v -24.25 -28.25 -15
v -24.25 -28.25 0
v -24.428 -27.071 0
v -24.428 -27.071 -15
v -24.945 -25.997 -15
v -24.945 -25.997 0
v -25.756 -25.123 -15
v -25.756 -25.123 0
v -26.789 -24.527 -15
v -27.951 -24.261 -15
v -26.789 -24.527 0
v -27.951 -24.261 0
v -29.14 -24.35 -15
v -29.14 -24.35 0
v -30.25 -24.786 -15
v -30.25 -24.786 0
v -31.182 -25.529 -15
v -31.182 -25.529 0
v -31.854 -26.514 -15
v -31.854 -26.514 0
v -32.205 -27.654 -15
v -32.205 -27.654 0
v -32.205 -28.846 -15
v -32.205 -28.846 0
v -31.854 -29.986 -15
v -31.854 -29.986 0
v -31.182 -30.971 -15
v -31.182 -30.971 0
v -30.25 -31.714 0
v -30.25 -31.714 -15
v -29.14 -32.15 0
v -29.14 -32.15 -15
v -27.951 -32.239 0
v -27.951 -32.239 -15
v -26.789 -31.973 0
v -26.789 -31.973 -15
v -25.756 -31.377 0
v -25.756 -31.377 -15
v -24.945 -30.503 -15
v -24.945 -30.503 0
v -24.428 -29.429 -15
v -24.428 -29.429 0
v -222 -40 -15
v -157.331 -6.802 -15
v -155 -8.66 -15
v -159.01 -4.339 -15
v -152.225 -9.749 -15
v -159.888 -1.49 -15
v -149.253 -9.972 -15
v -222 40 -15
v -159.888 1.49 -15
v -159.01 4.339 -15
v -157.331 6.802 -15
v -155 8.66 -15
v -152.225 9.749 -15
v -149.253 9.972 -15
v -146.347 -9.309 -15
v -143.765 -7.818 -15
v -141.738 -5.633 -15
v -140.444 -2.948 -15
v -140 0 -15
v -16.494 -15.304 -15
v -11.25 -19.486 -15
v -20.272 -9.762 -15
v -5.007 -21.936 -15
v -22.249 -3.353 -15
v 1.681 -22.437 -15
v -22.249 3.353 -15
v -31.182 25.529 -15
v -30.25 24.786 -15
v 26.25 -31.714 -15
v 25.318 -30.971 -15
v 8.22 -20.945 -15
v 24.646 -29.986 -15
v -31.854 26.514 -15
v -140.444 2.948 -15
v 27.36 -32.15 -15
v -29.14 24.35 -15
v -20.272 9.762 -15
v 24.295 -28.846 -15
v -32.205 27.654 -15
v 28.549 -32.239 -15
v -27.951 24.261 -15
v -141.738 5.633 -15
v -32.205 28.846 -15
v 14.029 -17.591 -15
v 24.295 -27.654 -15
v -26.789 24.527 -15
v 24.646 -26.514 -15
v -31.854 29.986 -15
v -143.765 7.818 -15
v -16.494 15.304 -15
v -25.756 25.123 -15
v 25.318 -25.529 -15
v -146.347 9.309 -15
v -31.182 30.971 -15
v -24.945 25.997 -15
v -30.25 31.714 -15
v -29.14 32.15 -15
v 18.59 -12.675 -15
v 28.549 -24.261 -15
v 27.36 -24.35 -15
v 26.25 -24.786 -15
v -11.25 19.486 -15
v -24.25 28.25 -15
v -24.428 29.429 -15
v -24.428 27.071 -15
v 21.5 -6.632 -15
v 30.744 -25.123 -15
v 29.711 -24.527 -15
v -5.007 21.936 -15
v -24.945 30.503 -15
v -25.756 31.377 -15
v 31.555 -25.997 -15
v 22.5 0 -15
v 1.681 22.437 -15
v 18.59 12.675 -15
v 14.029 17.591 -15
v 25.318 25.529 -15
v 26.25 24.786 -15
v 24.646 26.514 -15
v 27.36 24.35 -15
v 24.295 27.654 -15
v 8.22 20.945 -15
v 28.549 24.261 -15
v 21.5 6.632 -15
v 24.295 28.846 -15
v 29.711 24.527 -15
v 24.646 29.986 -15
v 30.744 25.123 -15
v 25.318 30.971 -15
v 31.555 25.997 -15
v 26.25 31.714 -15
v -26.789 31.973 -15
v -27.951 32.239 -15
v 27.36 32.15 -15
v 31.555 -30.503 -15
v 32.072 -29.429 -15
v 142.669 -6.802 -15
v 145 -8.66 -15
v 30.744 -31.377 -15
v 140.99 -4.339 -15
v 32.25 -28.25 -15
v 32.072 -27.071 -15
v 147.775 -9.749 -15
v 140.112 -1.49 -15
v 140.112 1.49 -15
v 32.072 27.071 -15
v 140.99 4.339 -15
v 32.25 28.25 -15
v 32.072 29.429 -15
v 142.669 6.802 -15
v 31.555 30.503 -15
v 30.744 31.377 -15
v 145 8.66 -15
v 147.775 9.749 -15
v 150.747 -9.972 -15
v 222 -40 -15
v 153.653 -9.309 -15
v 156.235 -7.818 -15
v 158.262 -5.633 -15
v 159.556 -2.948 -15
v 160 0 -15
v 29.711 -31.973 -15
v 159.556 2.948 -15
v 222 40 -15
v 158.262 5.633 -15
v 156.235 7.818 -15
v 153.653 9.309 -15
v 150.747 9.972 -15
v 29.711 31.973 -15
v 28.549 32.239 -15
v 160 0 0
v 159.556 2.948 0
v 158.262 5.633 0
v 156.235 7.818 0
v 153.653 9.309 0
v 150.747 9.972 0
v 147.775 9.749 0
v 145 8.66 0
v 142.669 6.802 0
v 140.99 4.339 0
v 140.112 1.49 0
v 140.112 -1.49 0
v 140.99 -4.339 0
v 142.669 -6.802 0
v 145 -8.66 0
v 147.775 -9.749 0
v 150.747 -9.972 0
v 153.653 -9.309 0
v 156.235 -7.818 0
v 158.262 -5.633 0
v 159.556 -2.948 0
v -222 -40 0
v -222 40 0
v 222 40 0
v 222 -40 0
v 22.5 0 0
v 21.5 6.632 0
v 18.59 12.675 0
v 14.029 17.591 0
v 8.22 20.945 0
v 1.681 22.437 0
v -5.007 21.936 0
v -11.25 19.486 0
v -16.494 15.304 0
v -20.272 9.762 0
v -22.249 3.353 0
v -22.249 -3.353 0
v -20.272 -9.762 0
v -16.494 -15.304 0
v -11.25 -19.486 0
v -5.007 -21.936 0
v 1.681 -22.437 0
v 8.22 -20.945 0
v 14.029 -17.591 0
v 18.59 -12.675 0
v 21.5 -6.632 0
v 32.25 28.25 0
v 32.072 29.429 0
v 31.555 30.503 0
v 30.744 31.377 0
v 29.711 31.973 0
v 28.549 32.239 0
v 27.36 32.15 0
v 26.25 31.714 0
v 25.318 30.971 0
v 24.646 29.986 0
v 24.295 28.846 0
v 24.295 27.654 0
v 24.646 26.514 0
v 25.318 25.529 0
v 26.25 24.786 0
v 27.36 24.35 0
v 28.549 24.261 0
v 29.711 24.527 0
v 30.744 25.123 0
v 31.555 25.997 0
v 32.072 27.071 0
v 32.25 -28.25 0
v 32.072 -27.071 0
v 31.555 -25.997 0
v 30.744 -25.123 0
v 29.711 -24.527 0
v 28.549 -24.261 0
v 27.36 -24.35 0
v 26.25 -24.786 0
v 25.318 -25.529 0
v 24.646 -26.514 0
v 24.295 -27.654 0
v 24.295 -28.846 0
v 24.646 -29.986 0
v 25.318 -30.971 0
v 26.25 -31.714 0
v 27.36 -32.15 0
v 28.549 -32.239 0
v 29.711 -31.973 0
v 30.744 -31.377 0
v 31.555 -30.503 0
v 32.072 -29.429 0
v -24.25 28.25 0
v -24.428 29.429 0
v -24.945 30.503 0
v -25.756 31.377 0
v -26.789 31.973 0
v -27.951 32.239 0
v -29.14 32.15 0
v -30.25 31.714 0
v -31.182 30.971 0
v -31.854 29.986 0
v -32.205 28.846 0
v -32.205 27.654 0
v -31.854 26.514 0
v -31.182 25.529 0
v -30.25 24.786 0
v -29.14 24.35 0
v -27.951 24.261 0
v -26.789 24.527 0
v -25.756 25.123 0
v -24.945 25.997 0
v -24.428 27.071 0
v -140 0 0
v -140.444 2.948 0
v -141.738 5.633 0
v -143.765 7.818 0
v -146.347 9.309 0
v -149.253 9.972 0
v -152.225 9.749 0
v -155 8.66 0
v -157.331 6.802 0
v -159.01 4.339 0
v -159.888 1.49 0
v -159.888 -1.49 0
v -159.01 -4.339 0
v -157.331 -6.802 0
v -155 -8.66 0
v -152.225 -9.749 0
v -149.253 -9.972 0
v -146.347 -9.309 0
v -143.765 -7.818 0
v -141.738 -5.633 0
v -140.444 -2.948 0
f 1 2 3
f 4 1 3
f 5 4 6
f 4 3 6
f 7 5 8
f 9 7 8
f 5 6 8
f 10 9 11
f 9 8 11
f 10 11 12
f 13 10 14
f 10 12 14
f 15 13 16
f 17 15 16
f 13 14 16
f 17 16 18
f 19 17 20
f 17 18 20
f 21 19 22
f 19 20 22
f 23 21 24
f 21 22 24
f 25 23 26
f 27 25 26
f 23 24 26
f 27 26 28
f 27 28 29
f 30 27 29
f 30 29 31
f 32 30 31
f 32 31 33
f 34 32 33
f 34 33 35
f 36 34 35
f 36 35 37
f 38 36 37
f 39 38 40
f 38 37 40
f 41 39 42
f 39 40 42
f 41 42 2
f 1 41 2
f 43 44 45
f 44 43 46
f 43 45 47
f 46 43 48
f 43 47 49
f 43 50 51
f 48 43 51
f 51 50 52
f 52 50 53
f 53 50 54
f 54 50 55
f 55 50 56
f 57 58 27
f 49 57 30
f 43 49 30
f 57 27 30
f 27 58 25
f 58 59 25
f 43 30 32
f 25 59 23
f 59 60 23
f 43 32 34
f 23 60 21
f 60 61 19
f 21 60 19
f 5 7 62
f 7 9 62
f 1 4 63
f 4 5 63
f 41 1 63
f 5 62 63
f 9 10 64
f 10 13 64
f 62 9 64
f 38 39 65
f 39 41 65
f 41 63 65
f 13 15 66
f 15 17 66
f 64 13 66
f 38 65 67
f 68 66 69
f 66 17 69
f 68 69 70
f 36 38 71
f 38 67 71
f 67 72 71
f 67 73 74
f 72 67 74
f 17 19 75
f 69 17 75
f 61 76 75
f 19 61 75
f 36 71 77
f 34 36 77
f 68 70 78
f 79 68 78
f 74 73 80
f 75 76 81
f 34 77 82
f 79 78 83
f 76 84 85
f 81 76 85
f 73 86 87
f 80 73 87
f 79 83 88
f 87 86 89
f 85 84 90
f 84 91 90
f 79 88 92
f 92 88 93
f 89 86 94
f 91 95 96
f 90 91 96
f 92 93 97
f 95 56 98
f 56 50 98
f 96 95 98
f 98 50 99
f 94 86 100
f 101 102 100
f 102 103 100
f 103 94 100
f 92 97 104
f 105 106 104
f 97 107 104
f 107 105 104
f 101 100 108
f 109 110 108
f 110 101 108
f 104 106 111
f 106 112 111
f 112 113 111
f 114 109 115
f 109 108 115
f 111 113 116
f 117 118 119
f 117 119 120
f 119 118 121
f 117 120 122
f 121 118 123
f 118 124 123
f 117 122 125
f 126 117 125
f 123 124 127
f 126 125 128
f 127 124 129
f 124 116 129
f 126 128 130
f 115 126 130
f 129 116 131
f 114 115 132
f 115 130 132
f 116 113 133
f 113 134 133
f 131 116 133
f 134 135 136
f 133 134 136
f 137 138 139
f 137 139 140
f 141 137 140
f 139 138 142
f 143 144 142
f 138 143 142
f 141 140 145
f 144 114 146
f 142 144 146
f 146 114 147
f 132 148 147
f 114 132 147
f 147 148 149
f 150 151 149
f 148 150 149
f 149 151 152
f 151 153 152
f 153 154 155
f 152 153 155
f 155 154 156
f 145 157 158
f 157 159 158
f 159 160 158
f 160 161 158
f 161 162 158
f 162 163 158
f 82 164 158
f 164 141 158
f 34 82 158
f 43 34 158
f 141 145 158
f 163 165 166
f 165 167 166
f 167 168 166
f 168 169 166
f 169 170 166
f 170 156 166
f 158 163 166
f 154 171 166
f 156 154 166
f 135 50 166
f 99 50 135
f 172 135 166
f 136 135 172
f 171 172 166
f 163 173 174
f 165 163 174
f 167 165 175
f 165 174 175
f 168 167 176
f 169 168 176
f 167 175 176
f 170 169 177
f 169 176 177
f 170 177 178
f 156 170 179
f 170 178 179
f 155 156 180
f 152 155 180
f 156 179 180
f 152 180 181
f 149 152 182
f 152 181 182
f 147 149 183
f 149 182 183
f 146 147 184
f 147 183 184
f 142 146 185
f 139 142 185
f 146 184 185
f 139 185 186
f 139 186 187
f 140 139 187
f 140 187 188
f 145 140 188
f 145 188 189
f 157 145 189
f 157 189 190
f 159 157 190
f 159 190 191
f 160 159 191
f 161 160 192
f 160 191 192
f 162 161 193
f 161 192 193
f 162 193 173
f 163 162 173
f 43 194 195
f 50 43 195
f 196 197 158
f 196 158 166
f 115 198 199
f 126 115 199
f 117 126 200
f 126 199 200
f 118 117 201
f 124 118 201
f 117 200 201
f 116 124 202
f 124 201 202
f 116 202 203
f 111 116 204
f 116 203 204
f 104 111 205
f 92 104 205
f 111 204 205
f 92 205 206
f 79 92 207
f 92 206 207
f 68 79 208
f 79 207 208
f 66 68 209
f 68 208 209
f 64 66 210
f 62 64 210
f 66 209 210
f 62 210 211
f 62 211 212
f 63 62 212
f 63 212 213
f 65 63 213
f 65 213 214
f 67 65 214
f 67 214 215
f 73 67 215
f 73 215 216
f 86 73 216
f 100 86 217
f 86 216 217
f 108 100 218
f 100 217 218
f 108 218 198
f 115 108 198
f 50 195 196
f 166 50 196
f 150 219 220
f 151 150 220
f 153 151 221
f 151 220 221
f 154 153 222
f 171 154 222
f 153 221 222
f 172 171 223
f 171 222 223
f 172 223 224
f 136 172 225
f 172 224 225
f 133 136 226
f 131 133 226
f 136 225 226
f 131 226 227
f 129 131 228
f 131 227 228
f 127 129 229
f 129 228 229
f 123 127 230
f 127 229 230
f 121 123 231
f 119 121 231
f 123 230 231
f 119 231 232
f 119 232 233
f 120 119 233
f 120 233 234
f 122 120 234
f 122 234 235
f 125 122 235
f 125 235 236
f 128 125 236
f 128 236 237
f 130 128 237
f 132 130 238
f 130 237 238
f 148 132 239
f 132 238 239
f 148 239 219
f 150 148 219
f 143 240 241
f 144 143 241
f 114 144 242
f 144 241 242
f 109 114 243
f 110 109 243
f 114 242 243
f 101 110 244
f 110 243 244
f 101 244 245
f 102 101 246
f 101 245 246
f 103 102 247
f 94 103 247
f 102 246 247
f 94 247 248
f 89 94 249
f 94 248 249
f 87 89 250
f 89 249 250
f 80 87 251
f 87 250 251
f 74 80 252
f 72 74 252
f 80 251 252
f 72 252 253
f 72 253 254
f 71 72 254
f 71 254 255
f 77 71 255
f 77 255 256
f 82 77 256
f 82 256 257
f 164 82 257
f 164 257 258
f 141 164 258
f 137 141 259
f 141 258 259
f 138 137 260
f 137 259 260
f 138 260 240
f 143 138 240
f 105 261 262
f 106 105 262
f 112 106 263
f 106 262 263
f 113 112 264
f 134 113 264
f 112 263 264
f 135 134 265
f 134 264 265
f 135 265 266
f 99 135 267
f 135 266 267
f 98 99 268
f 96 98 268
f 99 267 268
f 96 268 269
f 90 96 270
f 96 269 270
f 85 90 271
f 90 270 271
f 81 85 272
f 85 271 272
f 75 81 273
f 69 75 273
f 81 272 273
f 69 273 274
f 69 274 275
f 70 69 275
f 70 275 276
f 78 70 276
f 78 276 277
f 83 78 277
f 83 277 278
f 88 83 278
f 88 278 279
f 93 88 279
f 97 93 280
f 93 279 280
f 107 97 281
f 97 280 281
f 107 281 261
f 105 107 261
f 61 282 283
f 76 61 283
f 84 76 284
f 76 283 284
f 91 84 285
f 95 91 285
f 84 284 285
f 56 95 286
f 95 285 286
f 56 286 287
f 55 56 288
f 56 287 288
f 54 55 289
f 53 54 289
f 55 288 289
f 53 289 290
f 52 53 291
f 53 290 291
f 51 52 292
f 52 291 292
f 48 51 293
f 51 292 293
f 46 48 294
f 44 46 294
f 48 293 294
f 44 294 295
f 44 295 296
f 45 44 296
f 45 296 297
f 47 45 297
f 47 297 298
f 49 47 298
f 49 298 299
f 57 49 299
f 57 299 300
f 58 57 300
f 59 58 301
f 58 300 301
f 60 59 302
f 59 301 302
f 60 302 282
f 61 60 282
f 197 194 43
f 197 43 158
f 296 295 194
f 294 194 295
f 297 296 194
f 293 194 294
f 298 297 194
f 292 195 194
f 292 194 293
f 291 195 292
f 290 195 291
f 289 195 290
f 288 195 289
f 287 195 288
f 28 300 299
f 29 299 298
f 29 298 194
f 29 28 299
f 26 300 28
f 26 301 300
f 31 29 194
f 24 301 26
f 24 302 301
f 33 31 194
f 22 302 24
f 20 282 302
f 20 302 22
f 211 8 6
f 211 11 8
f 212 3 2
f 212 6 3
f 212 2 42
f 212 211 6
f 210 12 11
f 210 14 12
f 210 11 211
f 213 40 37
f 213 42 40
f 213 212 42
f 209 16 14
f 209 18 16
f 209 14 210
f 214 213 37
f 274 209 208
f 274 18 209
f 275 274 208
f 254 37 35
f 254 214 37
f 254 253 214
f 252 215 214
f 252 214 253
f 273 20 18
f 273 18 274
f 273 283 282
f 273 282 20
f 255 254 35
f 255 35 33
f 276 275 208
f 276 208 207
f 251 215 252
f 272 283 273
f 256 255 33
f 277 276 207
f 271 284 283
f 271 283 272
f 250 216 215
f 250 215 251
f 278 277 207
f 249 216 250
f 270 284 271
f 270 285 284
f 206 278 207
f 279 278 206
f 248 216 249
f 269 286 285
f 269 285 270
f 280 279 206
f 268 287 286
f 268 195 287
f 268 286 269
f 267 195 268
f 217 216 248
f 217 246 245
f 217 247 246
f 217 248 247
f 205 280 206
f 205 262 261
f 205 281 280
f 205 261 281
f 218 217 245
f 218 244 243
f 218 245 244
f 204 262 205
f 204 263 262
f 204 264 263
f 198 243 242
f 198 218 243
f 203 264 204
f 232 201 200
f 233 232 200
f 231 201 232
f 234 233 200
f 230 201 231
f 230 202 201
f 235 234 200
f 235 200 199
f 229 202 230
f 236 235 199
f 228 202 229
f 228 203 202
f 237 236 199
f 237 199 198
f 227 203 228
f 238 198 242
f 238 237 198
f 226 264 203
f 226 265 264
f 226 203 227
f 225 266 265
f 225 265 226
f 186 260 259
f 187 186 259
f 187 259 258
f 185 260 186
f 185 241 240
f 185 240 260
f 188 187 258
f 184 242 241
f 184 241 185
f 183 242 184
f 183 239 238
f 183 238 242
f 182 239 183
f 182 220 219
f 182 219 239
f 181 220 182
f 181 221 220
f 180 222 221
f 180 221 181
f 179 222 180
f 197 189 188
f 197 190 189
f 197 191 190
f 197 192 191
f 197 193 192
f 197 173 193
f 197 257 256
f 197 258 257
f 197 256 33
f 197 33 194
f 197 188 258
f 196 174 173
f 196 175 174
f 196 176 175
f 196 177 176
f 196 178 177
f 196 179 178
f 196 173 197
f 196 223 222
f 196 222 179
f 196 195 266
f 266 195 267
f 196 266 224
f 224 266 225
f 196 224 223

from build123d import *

# Parameters (mm, degrees)
CROQUIS1_W              = 444
CROQUIS1_H              = 80
CROQUIS1_R              = 22.5
CROQUIS1_R_2            = 4
CROQUIS1_R_3            = 10
SALIENTE_EXTRUIR1_DEPTH = 15


with BuildPart() as part:
    # Croquis1 → Saliente-Extruir1 (new body)
    with BuildSketch(Plane.XY):
        Rectangle(CROQUIS1_W, CROQUIS1_H)
        Circle(CROQUIS1_R, mode=Mode.SUBTRACT)
        with Locations((28.25, 28.25)):
            Circle(CROQUIS1_R_2, mode=Mode.SUBTRACT)
        with Locations((-28.25, 28.25)):
            Circle(CROQUIS1_R_2, mode=Mode.SUBTRACT)
        with Locations((28.25, -28.25)):
            Circle(CROQUIS1_R_2, mode=Mode.SUBTRACT)
        with Locations((-28.25, -28.25)):
            Circle(CROQUIS1_R_2, mode=Mode.SUBTRACT)
        with Locations((-150, 0)):
            Circle(CROQUIS1_R_3, mode=Mode.SUBTRACT)
        with Locations((150, 0)):
            Circle(CROQUIS1_R_3, mode=Mode.SUBTRACT)
    extrude(amount=-SALIENTE_EXTRUIR1_DEPTH)


solid = part.part
